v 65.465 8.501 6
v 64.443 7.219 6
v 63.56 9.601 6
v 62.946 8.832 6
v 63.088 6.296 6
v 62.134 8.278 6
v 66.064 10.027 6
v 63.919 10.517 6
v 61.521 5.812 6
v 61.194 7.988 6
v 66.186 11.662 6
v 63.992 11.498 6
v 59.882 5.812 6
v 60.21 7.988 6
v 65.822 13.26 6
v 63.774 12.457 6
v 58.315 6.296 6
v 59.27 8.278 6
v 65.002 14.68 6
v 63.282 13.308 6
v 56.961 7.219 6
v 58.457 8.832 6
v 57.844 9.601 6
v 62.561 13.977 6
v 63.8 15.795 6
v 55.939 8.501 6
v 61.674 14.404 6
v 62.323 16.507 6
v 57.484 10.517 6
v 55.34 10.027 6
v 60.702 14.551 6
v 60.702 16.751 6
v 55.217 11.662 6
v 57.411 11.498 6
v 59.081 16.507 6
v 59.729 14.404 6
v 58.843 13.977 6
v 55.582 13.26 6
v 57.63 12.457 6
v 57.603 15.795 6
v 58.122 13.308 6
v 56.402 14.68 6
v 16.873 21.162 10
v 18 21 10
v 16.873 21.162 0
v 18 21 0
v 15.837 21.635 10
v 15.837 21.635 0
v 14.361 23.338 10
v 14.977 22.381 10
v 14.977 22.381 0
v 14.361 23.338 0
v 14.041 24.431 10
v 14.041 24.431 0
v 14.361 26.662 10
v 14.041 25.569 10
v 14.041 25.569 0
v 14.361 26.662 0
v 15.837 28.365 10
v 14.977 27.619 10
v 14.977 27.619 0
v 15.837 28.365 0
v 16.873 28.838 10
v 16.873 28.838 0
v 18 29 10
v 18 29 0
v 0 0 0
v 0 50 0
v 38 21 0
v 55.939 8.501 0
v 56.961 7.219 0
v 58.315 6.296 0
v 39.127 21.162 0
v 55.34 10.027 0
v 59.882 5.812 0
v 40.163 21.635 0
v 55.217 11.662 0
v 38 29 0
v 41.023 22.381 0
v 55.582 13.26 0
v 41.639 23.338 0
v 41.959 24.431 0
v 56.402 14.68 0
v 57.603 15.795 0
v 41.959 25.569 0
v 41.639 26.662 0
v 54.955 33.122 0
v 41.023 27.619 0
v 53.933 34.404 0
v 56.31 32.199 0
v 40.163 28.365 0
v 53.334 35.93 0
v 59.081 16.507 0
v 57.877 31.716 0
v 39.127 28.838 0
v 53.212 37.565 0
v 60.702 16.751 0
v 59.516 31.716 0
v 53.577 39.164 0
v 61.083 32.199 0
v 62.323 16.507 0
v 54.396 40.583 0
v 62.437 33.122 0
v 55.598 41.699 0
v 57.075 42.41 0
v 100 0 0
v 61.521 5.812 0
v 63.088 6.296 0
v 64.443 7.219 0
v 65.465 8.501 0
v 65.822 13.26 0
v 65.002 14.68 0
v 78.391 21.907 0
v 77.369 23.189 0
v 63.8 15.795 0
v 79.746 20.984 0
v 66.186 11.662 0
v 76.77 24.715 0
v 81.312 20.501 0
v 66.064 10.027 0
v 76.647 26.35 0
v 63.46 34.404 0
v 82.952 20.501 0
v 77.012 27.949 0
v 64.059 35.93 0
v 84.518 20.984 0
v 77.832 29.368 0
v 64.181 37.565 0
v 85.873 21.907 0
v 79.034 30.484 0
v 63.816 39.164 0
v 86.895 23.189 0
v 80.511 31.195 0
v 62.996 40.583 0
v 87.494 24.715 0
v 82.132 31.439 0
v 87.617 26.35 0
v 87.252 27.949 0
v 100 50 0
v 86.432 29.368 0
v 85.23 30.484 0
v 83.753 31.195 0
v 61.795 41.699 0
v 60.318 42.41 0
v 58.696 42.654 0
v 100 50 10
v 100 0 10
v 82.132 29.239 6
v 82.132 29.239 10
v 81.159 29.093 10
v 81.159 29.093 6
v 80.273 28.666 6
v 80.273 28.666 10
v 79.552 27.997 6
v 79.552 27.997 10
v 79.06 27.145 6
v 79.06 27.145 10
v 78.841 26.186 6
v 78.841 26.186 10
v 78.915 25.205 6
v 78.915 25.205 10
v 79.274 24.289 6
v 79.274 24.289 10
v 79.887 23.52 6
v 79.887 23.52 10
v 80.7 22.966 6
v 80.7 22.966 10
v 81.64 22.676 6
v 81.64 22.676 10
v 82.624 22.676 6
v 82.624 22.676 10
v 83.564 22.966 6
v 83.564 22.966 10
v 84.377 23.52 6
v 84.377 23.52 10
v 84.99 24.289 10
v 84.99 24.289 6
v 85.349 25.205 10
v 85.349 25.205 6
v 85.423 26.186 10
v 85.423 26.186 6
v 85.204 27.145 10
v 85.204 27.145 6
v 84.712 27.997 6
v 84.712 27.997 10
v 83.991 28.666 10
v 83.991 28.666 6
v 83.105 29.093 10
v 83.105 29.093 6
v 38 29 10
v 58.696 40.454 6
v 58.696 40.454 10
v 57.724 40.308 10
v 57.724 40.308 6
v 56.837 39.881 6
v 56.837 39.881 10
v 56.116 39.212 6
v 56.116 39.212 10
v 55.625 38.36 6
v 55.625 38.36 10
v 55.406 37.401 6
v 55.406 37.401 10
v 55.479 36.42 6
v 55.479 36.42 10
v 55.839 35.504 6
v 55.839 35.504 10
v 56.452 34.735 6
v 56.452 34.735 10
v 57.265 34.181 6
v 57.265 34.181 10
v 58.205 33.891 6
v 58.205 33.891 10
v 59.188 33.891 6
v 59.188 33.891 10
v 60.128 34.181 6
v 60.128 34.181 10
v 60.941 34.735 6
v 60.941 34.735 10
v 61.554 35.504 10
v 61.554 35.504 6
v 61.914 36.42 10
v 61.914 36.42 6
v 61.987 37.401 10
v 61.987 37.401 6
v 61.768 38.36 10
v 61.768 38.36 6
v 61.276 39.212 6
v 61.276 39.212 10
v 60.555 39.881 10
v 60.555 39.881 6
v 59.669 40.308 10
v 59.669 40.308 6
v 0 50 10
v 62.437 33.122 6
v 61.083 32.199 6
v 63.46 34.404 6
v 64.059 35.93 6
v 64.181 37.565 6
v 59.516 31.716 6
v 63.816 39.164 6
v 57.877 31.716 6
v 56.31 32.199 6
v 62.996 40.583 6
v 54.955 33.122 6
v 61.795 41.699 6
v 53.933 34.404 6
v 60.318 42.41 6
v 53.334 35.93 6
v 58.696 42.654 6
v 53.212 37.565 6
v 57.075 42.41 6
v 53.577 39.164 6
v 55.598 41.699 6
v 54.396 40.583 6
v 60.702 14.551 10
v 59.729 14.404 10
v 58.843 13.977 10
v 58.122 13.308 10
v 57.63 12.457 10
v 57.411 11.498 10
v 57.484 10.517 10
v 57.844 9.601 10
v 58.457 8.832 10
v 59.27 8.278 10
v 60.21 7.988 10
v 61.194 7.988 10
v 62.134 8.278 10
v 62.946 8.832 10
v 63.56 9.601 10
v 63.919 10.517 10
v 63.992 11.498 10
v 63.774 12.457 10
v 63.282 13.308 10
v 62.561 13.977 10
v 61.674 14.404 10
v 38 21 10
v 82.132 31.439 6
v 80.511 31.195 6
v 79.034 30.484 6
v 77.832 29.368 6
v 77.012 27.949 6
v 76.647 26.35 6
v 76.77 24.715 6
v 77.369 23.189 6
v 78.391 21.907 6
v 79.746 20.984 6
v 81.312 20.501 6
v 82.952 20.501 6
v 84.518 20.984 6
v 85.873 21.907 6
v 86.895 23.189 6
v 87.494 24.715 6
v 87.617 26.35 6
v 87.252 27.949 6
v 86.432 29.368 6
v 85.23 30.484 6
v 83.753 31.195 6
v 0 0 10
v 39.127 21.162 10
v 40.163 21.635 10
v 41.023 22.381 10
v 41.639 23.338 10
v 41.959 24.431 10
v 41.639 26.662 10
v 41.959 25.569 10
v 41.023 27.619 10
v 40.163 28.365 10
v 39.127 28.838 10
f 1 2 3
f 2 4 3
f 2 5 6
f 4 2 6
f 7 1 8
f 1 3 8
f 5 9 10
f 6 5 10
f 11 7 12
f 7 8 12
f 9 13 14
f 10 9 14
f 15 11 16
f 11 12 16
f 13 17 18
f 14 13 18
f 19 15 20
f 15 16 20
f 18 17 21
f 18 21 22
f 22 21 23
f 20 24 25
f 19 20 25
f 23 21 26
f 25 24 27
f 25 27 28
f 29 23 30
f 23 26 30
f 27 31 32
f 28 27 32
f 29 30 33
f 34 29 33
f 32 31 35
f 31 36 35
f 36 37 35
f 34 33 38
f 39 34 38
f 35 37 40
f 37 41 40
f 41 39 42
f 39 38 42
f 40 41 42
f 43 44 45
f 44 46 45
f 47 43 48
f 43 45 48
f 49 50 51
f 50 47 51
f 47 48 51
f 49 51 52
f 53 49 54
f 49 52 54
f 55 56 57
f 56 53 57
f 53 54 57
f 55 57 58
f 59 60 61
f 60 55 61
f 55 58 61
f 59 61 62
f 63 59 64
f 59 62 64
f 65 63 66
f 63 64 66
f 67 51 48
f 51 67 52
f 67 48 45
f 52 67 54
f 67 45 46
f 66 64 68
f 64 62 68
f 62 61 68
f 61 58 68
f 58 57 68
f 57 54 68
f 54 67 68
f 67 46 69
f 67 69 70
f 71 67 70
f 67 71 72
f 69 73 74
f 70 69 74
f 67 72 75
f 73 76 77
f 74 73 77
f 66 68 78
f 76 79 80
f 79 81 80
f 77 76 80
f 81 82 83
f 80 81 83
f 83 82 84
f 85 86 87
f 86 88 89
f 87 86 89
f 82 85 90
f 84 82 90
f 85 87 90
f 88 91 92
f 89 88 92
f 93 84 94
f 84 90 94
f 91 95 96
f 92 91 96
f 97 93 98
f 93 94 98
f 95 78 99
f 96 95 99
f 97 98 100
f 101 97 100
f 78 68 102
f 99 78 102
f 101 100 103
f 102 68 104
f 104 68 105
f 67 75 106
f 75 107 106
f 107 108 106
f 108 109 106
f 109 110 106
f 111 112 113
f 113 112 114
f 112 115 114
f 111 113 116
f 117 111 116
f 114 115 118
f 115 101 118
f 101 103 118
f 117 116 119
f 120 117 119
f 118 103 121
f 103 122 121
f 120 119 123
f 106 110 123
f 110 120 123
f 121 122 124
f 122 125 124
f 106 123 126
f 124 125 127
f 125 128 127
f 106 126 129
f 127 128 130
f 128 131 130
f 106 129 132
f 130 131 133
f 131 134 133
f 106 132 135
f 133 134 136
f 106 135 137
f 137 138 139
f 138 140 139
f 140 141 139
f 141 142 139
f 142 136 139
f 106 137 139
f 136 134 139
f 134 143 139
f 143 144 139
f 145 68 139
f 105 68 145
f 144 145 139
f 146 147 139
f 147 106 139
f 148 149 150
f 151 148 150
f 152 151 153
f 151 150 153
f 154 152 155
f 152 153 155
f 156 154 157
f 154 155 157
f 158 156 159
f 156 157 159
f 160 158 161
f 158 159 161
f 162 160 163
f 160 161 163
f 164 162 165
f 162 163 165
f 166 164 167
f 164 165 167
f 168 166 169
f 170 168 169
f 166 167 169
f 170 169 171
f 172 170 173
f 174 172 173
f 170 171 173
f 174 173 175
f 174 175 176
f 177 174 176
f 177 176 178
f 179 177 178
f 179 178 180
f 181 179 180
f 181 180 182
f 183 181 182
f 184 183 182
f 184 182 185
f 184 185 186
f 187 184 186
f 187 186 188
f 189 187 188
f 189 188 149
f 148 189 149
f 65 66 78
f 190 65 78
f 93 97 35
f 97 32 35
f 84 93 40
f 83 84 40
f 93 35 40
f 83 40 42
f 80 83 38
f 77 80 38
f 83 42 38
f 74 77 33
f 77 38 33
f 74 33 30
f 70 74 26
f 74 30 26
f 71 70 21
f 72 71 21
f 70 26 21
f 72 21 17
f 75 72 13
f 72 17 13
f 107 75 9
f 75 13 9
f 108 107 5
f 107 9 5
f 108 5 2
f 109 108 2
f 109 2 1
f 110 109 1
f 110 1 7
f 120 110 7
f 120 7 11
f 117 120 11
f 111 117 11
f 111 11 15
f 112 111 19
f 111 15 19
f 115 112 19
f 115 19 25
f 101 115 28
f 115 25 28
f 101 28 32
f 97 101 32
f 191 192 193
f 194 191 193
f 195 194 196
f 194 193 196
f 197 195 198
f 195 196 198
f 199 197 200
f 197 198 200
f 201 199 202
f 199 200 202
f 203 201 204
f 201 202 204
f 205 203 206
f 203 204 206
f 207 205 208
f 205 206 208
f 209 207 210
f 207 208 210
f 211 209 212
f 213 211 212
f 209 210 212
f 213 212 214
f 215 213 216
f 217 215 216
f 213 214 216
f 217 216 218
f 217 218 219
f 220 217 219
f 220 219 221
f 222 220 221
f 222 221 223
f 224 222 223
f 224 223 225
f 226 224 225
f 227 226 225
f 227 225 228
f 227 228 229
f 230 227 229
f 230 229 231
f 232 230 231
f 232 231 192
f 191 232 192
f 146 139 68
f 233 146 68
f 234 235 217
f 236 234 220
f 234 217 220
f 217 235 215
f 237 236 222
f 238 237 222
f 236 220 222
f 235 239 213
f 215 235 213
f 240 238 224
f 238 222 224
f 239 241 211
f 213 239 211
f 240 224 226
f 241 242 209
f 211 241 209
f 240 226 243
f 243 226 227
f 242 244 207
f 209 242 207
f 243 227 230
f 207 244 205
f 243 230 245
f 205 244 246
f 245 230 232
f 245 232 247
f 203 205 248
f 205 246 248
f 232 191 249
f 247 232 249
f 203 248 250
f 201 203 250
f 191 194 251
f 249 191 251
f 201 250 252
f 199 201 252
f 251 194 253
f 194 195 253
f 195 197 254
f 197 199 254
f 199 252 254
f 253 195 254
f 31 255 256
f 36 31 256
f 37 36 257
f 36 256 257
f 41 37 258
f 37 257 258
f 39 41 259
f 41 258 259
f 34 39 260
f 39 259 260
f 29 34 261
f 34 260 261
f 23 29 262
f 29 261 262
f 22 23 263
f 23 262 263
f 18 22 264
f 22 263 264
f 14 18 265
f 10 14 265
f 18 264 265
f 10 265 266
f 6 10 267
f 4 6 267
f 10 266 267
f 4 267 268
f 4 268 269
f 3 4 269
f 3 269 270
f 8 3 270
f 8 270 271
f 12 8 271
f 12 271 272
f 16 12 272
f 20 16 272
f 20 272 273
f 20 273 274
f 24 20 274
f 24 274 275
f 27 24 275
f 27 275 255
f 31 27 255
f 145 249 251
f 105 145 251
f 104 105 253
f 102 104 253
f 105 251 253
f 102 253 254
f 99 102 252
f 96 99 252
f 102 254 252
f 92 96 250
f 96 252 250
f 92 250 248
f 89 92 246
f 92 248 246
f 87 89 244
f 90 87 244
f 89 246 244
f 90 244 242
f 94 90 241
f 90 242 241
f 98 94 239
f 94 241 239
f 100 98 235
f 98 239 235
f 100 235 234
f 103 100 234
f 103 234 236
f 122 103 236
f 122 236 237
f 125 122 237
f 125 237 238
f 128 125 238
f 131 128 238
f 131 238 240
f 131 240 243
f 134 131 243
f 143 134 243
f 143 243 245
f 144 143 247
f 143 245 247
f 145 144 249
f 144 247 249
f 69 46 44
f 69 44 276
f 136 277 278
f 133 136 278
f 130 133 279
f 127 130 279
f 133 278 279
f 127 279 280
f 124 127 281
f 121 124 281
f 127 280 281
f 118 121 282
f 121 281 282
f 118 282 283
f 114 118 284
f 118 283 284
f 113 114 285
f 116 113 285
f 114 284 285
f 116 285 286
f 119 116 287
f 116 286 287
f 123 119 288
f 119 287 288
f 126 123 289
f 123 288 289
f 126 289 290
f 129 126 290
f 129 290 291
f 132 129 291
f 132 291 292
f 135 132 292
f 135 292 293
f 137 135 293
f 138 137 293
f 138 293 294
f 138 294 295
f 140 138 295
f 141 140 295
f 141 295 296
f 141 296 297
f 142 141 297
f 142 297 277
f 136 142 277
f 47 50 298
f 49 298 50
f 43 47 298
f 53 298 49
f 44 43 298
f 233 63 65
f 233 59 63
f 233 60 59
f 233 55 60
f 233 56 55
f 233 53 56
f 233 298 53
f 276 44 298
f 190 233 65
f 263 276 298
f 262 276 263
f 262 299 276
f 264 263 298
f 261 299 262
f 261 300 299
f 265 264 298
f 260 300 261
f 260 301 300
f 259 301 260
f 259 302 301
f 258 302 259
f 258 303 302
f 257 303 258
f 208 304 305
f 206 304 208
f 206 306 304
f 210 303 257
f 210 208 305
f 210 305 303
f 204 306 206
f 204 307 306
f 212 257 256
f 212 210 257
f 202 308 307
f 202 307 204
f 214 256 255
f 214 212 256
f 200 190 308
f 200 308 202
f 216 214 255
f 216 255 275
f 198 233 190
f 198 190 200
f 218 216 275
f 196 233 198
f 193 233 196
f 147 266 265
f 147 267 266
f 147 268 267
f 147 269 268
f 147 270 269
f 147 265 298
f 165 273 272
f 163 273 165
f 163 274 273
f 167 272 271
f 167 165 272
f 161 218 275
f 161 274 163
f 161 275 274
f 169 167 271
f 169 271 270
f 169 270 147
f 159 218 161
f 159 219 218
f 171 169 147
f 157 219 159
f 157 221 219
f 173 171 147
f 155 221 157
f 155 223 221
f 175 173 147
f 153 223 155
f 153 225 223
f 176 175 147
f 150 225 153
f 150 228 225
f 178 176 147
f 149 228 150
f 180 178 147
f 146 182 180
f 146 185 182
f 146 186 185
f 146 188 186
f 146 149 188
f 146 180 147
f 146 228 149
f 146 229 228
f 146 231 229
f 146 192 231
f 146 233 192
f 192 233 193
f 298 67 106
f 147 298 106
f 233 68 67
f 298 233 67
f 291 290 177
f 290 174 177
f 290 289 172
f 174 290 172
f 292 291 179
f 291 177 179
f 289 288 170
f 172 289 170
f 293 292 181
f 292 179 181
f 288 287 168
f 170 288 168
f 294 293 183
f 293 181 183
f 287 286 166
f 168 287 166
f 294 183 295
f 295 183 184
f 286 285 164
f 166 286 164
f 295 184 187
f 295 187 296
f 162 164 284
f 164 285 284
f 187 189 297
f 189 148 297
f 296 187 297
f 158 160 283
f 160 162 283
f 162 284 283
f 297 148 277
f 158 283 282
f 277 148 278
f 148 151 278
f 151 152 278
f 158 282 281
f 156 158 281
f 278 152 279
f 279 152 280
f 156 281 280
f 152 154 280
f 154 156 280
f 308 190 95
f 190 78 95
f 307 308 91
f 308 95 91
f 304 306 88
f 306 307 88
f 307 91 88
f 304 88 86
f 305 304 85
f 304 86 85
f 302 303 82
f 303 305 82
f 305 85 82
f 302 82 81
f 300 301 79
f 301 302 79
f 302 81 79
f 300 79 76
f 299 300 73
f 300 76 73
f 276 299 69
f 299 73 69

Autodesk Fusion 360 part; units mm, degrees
sketch "Sketch1" plane through (0, 0, 0) normal (0, 0, 1) x (1, 0, 0)
  line L0 (0, 0) -> (100, 0)
  line L1 (100, 0) -> (100, 50)
  line L2 (100, 50) -> (0, 50)
  line L3 (0, 50) -> (0, 0)
  circle A0 centre (82.132, 25.9392) radius 5.5
  circle A1 centre (60.7017, 11.2509) radius 5.5
  circle A2 centre (58.6964, 37.1542) radius 3
  line L4 (18, 29) -> (38, 29)
  line L5 (18, 21) -> (38, 21)
  arc A3 (18, 29) -> (18, 21) centre (18, 25) ccw
  arc A4 (38, 21) -> (38, 29) centre (38, 25) ccw
  circle A5 centre (58.6964, 37.1542) radius 5.5
  circle A6 centre (60.7017, 11.2509) radius 3.3
  circle A7 centre (82.132, 25.9392) radius 3.3
  dimension "d24" = 11
  dimension "d25" = 11
  dimension "d26" = 6.6
  dimension "d27" = 11
  dimension "d28" = 6.6
sketch "Sketch2" plane through (0, 0, 0) normal (0, 0, 1) x (1, 0, 0)
extrude "Extrude1" add sketch "Sketch1" along normal blind 10 contours L0 L1 L2 L3 | A0 | A1 | A2 | A5 | A6 | A7
hole "Hole1" at (58.6964, 37.1542, 0) at (60.7017, 11.2509, 0) at (82.132, 25.9392, 0) direction (0, 0, 1) diameter 6.6 depth 20 tip angle 118 counterbore diameter 11 counterbore depth 6
